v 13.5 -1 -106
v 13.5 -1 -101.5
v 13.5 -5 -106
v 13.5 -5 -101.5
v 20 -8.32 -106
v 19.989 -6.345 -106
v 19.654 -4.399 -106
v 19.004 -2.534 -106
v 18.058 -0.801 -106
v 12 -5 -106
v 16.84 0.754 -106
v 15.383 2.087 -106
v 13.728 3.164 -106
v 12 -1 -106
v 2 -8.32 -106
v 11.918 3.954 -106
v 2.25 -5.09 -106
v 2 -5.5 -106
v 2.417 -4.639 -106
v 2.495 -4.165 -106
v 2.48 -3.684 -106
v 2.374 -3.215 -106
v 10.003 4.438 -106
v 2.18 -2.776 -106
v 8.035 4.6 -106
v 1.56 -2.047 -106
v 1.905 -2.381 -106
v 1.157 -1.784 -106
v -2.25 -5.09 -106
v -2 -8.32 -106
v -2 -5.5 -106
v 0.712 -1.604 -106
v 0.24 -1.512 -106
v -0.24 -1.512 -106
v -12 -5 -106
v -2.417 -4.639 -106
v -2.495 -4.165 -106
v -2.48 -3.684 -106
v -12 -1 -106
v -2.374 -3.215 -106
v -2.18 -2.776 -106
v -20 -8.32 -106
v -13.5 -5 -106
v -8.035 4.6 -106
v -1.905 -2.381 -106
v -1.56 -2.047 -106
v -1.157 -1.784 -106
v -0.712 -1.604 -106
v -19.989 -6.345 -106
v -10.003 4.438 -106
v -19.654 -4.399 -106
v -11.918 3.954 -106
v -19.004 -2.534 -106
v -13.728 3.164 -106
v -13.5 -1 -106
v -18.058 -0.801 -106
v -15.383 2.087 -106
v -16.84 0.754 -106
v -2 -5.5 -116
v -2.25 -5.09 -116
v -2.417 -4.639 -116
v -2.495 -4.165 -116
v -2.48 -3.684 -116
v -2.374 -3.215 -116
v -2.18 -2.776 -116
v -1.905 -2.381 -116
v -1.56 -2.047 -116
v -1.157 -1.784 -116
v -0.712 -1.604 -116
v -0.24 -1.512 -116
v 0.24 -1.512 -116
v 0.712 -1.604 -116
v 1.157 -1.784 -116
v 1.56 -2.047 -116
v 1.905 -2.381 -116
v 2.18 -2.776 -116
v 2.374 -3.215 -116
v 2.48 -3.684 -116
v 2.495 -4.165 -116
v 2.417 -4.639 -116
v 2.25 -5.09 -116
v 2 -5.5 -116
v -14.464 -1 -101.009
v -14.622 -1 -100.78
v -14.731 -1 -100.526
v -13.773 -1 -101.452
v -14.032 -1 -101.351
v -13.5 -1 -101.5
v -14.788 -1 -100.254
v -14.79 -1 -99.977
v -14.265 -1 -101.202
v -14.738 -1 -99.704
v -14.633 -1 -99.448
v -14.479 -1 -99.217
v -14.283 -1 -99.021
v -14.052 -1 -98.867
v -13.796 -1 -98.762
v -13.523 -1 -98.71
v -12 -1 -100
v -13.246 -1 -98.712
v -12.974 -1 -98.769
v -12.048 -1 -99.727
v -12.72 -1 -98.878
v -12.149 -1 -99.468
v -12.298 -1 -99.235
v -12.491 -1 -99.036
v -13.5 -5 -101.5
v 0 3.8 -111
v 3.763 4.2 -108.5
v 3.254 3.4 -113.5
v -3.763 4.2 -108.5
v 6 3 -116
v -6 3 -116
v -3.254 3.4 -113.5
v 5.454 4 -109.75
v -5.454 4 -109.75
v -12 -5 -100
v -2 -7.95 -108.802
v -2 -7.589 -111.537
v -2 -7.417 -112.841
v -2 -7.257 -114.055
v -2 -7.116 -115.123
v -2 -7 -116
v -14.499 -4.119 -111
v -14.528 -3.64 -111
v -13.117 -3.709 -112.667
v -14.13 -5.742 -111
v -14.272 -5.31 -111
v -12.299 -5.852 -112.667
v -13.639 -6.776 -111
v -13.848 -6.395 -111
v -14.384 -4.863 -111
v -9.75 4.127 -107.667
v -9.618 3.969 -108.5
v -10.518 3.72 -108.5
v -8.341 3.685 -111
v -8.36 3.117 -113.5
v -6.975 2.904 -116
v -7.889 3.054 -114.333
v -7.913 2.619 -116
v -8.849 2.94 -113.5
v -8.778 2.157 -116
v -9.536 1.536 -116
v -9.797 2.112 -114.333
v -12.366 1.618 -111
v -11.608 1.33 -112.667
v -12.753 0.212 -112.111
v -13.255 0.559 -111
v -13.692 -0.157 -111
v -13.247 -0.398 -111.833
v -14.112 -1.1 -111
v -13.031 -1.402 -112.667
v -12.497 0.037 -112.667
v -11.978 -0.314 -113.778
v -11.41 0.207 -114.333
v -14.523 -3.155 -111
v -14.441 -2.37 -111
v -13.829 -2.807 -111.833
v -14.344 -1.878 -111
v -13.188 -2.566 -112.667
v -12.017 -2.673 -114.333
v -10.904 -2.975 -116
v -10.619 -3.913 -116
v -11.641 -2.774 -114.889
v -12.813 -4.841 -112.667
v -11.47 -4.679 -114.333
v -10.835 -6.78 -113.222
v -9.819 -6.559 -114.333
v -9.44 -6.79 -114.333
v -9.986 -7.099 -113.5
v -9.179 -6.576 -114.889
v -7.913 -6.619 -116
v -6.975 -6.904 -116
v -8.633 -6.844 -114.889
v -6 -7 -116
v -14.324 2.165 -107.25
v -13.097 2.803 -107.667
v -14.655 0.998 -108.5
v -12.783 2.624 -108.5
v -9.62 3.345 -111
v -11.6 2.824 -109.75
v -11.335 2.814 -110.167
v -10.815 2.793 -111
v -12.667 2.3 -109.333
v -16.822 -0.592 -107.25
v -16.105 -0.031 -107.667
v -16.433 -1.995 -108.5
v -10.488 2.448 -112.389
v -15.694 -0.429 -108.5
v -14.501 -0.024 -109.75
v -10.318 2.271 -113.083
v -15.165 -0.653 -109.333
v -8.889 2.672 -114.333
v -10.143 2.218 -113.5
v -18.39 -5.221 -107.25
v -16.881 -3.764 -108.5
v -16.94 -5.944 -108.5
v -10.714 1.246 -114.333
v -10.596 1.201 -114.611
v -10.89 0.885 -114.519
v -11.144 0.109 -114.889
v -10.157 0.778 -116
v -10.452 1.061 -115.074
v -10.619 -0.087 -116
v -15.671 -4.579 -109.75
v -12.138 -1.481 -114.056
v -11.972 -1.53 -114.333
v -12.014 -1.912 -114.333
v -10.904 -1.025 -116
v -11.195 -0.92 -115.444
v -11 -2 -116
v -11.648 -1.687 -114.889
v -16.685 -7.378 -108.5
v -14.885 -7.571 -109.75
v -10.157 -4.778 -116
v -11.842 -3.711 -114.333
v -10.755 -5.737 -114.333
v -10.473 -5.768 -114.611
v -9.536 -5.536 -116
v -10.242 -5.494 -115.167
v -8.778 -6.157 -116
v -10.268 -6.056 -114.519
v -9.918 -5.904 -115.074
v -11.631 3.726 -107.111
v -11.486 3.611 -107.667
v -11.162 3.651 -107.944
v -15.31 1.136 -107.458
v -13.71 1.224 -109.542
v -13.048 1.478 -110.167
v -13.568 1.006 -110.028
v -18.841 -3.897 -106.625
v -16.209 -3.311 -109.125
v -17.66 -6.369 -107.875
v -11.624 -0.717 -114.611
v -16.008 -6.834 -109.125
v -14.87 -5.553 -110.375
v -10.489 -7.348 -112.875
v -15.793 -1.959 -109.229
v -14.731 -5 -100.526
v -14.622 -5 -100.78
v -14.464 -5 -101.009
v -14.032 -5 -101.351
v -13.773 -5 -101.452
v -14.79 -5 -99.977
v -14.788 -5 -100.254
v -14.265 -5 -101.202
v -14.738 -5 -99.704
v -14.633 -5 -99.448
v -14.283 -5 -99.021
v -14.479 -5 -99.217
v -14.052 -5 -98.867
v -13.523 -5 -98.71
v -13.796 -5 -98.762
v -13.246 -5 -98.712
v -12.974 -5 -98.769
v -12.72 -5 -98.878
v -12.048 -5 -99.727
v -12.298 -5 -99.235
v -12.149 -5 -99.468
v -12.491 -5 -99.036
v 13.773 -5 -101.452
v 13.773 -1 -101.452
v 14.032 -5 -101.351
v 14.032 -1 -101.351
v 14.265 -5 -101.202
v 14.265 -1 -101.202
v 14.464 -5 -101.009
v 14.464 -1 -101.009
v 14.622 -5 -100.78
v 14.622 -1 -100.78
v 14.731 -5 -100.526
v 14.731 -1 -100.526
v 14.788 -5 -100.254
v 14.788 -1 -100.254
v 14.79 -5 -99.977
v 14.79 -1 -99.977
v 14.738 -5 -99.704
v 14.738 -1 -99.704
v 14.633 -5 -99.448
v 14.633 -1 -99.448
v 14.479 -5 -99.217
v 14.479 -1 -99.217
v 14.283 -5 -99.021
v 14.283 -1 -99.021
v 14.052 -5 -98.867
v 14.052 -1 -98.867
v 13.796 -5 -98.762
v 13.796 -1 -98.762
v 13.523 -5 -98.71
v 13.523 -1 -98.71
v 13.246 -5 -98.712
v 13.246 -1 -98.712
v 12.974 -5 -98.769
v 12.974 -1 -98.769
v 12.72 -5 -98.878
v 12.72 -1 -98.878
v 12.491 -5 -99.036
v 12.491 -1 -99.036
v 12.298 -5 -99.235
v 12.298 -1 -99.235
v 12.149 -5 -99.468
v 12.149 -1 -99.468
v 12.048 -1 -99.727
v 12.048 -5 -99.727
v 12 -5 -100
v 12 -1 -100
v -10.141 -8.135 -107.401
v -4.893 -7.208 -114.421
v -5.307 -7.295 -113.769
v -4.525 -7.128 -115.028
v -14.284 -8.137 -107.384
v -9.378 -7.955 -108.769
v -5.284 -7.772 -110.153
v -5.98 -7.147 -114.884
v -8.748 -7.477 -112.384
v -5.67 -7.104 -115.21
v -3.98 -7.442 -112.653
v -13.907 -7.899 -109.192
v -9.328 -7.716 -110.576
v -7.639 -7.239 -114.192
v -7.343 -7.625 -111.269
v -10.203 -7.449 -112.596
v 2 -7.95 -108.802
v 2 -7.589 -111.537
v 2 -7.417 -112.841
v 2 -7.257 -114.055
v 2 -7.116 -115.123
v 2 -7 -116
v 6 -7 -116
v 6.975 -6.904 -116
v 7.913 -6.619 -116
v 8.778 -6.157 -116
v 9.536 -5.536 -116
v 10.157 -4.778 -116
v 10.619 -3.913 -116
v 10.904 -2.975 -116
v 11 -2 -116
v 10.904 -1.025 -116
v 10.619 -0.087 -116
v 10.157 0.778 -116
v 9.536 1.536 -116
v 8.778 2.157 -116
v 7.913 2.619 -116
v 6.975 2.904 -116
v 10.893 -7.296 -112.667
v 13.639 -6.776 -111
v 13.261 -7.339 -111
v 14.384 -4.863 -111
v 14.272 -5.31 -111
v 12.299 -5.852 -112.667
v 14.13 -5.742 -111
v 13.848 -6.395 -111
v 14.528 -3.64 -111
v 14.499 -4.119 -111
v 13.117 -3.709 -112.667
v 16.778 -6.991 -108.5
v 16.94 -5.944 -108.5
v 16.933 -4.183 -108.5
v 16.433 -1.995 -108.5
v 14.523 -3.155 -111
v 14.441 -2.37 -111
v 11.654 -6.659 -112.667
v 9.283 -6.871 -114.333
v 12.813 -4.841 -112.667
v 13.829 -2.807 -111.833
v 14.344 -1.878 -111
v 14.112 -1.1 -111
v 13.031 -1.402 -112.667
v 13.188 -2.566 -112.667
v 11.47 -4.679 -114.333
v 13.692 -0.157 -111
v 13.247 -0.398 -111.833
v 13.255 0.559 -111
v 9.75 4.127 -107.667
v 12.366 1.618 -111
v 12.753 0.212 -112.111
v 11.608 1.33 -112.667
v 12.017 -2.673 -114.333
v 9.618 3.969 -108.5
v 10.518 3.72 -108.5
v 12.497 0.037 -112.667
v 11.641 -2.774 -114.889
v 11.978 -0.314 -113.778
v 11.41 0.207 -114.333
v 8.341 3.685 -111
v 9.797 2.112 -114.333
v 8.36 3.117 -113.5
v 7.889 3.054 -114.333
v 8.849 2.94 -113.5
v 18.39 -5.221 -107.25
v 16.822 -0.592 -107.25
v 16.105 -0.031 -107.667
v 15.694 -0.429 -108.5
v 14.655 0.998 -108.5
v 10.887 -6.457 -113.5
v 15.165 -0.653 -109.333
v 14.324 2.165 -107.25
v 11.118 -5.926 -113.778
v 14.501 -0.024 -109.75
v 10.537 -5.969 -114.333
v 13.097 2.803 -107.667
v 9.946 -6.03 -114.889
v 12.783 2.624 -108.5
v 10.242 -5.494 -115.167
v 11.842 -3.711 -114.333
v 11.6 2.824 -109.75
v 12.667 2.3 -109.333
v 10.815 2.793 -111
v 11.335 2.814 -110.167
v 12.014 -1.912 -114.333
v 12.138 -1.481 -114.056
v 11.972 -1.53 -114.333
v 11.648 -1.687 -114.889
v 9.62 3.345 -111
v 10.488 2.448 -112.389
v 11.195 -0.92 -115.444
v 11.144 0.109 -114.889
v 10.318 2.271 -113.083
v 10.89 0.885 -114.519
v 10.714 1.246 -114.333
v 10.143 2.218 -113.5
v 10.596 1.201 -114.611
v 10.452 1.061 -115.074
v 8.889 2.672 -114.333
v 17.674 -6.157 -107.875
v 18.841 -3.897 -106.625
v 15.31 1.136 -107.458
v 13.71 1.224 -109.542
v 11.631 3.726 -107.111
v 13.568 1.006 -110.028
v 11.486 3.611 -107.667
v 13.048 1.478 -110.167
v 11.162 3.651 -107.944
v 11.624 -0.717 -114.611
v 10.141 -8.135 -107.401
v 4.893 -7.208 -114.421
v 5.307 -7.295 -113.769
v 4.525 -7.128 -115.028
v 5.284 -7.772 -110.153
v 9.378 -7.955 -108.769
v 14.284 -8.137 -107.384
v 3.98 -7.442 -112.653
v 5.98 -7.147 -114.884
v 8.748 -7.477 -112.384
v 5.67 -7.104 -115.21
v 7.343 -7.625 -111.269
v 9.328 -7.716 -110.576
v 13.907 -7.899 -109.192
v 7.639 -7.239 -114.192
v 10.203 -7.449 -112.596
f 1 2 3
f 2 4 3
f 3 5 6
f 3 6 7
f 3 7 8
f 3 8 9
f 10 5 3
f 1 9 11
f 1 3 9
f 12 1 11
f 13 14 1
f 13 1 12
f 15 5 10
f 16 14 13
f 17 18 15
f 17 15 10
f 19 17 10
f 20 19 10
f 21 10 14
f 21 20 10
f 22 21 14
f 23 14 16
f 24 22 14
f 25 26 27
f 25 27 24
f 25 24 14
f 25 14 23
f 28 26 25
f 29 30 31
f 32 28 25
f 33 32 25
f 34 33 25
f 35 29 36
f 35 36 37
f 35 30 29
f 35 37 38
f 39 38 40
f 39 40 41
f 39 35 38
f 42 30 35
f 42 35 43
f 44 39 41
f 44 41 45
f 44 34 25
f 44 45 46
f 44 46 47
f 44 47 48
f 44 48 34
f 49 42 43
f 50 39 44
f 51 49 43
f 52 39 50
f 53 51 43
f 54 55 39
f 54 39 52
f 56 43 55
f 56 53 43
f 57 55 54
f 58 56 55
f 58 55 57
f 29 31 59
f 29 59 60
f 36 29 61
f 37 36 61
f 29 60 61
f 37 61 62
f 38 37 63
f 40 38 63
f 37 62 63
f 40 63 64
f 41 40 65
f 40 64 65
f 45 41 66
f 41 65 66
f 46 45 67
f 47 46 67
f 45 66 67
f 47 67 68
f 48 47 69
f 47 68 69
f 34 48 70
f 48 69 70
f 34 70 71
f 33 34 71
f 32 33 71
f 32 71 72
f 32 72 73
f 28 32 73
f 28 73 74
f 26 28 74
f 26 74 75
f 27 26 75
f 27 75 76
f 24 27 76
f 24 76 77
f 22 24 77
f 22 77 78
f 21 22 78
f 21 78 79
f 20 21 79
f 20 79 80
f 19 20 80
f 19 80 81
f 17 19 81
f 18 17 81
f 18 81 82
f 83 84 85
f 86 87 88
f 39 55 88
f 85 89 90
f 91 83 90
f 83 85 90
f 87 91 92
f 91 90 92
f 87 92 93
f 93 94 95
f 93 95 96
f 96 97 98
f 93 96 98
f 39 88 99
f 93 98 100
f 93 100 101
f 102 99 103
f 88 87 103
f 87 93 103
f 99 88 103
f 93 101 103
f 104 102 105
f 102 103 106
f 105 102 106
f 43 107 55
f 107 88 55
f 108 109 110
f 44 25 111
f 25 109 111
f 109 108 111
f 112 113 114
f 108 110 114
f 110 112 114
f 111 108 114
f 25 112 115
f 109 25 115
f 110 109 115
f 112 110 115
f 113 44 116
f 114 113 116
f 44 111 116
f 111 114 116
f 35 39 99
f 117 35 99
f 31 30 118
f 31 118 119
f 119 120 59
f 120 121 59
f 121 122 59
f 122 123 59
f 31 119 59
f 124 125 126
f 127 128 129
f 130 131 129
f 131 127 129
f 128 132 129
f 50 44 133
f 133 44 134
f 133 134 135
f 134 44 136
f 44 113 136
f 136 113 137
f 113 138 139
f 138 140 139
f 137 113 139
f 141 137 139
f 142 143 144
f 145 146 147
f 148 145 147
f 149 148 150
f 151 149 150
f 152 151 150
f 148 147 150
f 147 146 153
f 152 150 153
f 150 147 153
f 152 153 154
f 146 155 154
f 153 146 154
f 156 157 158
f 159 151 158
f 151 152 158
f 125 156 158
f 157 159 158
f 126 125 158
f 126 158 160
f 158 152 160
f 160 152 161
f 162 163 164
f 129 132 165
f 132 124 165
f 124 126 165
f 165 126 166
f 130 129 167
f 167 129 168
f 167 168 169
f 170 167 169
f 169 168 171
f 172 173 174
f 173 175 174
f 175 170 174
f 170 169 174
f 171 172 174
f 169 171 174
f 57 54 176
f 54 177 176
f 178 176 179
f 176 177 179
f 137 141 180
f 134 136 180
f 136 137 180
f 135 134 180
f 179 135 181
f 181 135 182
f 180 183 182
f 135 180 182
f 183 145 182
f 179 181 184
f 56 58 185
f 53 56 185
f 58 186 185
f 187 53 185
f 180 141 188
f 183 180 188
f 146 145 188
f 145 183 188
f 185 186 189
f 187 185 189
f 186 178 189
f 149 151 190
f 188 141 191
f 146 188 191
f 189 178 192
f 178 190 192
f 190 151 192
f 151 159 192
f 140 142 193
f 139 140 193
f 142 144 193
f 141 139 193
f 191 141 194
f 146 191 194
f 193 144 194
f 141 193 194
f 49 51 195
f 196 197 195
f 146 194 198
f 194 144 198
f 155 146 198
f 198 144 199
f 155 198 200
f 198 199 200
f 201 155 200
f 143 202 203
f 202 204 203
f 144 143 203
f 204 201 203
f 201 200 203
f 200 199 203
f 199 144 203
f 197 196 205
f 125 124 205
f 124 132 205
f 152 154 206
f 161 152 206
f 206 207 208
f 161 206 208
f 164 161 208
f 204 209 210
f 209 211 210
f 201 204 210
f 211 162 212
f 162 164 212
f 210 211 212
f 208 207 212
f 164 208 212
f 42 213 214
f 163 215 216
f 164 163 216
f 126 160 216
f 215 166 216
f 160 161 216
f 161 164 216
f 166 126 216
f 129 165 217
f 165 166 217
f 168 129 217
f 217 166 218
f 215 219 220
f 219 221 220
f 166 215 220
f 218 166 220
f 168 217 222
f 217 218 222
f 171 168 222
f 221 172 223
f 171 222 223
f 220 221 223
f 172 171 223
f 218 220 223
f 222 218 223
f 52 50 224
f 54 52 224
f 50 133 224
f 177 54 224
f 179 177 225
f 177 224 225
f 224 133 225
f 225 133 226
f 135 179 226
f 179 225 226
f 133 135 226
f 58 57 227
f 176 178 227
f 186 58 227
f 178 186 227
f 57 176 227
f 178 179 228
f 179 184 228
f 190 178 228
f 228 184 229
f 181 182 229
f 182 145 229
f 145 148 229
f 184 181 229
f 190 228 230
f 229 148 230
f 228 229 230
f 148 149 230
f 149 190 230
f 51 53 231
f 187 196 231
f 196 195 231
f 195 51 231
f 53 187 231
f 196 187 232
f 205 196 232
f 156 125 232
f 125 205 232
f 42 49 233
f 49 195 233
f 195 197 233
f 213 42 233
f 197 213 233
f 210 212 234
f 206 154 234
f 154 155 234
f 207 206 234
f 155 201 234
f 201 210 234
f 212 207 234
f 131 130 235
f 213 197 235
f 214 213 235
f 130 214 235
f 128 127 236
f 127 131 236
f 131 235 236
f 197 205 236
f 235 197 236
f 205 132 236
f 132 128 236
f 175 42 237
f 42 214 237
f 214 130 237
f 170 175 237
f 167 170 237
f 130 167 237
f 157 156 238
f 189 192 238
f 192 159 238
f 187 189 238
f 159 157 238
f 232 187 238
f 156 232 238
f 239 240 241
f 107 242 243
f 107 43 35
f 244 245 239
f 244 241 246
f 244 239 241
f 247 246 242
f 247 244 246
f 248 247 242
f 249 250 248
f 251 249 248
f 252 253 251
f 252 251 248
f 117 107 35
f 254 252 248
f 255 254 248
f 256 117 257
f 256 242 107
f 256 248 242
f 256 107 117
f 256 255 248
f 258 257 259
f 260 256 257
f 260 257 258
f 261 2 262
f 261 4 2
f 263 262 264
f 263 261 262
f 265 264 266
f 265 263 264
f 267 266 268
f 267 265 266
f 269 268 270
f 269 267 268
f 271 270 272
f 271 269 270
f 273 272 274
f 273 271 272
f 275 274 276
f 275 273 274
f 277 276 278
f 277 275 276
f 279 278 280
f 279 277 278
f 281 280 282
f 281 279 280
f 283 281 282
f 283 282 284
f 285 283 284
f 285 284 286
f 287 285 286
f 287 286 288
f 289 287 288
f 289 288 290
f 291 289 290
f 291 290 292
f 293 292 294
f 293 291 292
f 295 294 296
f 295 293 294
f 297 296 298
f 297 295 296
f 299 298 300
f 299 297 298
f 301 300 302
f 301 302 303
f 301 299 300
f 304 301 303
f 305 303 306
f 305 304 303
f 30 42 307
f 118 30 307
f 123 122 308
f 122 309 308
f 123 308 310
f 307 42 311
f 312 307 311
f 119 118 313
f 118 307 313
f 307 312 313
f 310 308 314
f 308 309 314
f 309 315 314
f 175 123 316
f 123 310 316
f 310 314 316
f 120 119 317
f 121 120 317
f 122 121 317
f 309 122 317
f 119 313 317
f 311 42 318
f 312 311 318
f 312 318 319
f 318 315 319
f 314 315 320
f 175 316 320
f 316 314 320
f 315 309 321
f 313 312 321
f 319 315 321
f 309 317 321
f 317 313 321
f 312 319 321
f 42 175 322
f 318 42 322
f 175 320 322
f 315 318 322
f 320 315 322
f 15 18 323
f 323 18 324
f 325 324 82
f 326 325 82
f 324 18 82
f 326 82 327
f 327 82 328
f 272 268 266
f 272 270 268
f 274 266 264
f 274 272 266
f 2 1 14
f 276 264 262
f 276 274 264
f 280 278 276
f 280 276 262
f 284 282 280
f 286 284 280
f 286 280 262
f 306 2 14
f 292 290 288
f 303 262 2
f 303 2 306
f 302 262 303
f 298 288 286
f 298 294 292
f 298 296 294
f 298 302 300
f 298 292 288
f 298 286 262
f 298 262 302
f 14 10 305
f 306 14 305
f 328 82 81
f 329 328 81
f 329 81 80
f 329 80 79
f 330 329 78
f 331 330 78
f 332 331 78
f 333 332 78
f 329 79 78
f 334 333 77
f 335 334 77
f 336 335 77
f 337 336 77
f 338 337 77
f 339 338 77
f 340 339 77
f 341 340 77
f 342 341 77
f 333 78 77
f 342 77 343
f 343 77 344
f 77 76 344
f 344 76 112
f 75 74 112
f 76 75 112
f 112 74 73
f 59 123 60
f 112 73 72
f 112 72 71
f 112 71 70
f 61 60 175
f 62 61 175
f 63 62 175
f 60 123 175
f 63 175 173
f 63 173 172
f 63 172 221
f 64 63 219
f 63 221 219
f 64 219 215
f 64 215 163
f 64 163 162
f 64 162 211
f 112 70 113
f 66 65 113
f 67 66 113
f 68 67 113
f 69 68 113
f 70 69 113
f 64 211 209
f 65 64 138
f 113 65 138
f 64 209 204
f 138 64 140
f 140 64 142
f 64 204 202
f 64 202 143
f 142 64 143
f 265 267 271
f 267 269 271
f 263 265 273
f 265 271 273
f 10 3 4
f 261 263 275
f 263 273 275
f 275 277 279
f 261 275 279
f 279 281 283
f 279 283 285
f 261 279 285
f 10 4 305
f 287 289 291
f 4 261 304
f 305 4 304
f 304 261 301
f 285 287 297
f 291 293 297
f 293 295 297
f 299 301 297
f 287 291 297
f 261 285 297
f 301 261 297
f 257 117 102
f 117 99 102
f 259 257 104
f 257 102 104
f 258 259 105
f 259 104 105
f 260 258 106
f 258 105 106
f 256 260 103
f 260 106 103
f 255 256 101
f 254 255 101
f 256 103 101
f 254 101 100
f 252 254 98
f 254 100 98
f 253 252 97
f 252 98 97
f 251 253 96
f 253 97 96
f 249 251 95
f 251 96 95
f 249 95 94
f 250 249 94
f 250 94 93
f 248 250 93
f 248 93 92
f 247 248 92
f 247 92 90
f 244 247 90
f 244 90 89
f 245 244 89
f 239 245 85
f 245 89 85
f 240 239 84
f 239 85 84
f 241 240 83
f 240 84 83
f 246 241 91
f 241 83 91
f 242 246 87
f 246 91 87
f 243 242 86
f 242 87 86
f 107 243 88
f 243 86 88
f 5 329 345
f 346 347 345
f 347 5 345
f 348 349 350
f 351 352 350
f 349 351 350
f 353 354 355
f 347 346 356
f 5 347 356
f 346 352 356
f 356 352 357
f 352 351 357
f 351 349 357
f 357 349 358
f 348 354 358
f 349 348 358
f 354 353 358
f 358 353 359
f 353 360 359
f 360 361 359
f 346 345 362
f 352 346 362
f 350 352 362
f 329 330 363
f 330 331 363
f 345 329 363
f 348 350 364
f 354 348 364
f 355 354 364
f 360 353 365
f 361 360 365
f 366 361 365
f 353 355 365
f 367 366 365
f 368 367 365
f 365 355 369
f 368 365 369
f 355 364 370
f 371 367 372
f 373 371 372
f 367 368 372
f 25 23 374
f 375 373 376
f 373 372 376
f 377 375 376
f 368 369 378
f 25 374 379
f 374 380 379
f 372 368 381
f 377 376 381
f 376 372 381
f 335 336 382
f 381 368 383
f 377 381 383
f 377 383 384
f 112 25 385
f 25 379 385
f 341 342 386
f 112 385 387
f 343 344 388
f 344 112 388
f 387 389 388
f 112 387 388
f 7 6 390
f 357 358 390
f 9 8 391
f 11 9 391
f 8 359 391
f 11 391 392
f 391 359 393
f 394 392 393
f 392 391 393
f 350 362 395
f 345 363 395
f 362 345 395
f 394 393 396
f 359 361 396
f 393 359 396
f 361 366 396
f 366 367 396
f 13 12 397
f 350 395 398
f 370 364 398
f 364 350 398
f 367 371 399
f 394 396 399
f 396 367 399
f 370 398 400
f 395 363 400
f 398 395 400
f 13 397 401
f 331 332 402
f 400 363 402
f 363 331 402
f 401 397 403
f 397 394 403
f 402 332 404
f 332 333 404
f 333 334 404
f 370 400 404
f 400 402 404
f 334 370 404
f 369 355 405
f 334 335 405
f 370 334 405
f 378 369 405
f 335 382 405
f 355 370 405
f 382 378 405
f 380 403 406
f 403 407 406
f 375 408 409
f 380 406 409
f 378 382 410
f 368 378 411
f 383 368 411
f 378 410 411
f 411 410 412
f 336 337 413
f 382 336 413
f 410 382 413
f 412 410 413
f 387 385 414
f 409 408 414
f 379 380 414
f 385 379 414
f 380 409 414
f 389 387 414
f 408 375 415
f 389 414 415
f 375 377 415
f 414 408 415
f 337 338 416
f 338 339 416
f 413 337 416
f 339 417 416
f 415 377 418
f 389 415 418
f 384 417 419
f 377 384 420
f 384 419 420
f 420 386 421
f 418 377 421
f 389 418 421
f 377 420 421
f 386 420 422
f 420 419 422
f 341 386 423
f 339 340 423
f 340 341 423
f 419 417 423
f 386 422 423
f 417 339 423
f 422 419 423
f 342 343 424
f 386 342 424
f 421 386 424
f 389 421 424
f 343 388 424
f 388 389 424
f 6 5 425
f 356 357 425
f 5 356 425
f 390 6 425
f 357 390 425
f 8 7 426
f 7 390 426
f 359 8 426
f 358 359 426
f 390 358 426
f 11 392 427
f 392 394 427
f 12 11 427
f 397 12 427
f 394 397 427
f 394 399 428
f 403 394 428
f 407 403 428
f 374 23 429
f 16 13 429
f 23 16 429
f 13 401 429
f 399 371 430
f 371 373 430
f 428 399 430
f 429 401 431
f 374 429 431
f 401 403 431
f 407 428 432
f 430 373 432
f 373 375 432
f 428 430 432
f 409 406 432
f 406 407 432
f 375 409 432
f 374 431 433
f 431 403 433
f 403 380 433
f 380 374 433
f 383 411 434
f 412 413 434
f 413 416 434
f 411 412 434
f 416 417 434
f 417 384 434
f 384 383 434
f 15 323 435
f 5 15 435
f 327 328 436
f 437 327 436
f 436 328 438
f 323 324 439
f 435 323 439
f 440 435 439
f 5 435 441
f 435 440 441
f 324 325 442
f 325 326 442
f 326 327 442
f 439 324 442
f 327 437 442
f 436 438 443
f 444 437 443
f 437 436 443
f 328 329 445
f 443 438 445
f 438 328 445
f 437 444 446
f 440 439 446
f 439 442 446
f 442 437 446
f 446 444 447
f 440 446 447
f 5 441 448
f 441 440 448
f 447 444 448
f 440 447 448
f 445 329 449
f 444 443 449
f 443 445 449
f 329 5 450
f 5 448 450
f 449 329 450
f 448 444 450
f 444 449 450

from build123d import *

# Parameters (mm, degrees)
PAD003_DEPTH    = 2
POCKET059_DEPTH = 14


with BuildPart() as part:
    # Sketch161 (on XY_Plane of Origin) → AdditiveLoft001 section 0
    with BuildSketch(Plane.XY):
        with BuildLine():
            ThreePointArc((-8.035319, 4.6), (-16.839863, 0.753527), (-20, -8.32))
            Line((-20, -8.32), (20, -8.32))
            ThreePointArc((20, -8.32), (16.839863, 0.753527), (8.035319, 4.6))
            Line((-8.035319, 4.6), (8.035319, 4.6))
        make_face()
    # Sketch162 (on XY_Plane of Origin) → AdditiveLoft001 section 1
    with BuildSketch(Plane.XY.offset(-10)):
        with BuildLine():
            ThreePointArc((-6, 3), (-11, -2), (-6, -7))
            Line((-6, -7), (6, -7))
            ThreePointArc((6, -7), (11, -2), (6, 3))
            Line((-6, 3), (6, 3))
        make_face()
    loft()

    # Sketch163 (on XZ_Plane of Origin) → Pad003 (new body, symmetric)
    with BuildSketch(Plane.XZ.offset(3)):
        with BuildLine():
            Line((-12, 0), (-12, 6))
            ThreePointArc((-12, 6), (-14.386092, 6.886092), (-13.5, 4.5))
            Line((-13.5, 4.5), (-13.5, 0))
            Line((-13.5, 0), (-12, 0))
        make_face()
        with BuildLine():
            Line((12, 0), (12, 6))
            ThreePointArc((13.5, 4.5), (14.386092, 6.886092), (12, 6))
            Line((13.5, 4.5), (13.5, 0))
            Line((13.5, 0), (12, 0))
        make_face()
    extrude(amount=PAD003_DEPTH, both=True)

    # Sketch164 (on Face14 of Pad003) → Pocket059 (cut)
    with BuildSketch(Plane(origin=(0, 0, -10), x_dir=(1, 0, 0), z_dir=(0, 0, -1))):
        with BuildLine():
            Line((0, 13.5), (2, 13.5))
            Line((2, 5.5), (2, 13.5))
            ThreePointArc((-2, 5.5), (0, 1.5), (2, 5.5))
            Line((-2, 13.5), (-2, 5.5))
            Line((0, 13.5), (-2, 13.5))
        make_face()
    extrude(amount=-POCKET059_DEPTH, mode=Mode.SUBTRACT)


with BuildPart() as part_1:
    # Body placement: moved
    add(part.part.moved(Location((0, 0, -106))))


solid = part_1.part
